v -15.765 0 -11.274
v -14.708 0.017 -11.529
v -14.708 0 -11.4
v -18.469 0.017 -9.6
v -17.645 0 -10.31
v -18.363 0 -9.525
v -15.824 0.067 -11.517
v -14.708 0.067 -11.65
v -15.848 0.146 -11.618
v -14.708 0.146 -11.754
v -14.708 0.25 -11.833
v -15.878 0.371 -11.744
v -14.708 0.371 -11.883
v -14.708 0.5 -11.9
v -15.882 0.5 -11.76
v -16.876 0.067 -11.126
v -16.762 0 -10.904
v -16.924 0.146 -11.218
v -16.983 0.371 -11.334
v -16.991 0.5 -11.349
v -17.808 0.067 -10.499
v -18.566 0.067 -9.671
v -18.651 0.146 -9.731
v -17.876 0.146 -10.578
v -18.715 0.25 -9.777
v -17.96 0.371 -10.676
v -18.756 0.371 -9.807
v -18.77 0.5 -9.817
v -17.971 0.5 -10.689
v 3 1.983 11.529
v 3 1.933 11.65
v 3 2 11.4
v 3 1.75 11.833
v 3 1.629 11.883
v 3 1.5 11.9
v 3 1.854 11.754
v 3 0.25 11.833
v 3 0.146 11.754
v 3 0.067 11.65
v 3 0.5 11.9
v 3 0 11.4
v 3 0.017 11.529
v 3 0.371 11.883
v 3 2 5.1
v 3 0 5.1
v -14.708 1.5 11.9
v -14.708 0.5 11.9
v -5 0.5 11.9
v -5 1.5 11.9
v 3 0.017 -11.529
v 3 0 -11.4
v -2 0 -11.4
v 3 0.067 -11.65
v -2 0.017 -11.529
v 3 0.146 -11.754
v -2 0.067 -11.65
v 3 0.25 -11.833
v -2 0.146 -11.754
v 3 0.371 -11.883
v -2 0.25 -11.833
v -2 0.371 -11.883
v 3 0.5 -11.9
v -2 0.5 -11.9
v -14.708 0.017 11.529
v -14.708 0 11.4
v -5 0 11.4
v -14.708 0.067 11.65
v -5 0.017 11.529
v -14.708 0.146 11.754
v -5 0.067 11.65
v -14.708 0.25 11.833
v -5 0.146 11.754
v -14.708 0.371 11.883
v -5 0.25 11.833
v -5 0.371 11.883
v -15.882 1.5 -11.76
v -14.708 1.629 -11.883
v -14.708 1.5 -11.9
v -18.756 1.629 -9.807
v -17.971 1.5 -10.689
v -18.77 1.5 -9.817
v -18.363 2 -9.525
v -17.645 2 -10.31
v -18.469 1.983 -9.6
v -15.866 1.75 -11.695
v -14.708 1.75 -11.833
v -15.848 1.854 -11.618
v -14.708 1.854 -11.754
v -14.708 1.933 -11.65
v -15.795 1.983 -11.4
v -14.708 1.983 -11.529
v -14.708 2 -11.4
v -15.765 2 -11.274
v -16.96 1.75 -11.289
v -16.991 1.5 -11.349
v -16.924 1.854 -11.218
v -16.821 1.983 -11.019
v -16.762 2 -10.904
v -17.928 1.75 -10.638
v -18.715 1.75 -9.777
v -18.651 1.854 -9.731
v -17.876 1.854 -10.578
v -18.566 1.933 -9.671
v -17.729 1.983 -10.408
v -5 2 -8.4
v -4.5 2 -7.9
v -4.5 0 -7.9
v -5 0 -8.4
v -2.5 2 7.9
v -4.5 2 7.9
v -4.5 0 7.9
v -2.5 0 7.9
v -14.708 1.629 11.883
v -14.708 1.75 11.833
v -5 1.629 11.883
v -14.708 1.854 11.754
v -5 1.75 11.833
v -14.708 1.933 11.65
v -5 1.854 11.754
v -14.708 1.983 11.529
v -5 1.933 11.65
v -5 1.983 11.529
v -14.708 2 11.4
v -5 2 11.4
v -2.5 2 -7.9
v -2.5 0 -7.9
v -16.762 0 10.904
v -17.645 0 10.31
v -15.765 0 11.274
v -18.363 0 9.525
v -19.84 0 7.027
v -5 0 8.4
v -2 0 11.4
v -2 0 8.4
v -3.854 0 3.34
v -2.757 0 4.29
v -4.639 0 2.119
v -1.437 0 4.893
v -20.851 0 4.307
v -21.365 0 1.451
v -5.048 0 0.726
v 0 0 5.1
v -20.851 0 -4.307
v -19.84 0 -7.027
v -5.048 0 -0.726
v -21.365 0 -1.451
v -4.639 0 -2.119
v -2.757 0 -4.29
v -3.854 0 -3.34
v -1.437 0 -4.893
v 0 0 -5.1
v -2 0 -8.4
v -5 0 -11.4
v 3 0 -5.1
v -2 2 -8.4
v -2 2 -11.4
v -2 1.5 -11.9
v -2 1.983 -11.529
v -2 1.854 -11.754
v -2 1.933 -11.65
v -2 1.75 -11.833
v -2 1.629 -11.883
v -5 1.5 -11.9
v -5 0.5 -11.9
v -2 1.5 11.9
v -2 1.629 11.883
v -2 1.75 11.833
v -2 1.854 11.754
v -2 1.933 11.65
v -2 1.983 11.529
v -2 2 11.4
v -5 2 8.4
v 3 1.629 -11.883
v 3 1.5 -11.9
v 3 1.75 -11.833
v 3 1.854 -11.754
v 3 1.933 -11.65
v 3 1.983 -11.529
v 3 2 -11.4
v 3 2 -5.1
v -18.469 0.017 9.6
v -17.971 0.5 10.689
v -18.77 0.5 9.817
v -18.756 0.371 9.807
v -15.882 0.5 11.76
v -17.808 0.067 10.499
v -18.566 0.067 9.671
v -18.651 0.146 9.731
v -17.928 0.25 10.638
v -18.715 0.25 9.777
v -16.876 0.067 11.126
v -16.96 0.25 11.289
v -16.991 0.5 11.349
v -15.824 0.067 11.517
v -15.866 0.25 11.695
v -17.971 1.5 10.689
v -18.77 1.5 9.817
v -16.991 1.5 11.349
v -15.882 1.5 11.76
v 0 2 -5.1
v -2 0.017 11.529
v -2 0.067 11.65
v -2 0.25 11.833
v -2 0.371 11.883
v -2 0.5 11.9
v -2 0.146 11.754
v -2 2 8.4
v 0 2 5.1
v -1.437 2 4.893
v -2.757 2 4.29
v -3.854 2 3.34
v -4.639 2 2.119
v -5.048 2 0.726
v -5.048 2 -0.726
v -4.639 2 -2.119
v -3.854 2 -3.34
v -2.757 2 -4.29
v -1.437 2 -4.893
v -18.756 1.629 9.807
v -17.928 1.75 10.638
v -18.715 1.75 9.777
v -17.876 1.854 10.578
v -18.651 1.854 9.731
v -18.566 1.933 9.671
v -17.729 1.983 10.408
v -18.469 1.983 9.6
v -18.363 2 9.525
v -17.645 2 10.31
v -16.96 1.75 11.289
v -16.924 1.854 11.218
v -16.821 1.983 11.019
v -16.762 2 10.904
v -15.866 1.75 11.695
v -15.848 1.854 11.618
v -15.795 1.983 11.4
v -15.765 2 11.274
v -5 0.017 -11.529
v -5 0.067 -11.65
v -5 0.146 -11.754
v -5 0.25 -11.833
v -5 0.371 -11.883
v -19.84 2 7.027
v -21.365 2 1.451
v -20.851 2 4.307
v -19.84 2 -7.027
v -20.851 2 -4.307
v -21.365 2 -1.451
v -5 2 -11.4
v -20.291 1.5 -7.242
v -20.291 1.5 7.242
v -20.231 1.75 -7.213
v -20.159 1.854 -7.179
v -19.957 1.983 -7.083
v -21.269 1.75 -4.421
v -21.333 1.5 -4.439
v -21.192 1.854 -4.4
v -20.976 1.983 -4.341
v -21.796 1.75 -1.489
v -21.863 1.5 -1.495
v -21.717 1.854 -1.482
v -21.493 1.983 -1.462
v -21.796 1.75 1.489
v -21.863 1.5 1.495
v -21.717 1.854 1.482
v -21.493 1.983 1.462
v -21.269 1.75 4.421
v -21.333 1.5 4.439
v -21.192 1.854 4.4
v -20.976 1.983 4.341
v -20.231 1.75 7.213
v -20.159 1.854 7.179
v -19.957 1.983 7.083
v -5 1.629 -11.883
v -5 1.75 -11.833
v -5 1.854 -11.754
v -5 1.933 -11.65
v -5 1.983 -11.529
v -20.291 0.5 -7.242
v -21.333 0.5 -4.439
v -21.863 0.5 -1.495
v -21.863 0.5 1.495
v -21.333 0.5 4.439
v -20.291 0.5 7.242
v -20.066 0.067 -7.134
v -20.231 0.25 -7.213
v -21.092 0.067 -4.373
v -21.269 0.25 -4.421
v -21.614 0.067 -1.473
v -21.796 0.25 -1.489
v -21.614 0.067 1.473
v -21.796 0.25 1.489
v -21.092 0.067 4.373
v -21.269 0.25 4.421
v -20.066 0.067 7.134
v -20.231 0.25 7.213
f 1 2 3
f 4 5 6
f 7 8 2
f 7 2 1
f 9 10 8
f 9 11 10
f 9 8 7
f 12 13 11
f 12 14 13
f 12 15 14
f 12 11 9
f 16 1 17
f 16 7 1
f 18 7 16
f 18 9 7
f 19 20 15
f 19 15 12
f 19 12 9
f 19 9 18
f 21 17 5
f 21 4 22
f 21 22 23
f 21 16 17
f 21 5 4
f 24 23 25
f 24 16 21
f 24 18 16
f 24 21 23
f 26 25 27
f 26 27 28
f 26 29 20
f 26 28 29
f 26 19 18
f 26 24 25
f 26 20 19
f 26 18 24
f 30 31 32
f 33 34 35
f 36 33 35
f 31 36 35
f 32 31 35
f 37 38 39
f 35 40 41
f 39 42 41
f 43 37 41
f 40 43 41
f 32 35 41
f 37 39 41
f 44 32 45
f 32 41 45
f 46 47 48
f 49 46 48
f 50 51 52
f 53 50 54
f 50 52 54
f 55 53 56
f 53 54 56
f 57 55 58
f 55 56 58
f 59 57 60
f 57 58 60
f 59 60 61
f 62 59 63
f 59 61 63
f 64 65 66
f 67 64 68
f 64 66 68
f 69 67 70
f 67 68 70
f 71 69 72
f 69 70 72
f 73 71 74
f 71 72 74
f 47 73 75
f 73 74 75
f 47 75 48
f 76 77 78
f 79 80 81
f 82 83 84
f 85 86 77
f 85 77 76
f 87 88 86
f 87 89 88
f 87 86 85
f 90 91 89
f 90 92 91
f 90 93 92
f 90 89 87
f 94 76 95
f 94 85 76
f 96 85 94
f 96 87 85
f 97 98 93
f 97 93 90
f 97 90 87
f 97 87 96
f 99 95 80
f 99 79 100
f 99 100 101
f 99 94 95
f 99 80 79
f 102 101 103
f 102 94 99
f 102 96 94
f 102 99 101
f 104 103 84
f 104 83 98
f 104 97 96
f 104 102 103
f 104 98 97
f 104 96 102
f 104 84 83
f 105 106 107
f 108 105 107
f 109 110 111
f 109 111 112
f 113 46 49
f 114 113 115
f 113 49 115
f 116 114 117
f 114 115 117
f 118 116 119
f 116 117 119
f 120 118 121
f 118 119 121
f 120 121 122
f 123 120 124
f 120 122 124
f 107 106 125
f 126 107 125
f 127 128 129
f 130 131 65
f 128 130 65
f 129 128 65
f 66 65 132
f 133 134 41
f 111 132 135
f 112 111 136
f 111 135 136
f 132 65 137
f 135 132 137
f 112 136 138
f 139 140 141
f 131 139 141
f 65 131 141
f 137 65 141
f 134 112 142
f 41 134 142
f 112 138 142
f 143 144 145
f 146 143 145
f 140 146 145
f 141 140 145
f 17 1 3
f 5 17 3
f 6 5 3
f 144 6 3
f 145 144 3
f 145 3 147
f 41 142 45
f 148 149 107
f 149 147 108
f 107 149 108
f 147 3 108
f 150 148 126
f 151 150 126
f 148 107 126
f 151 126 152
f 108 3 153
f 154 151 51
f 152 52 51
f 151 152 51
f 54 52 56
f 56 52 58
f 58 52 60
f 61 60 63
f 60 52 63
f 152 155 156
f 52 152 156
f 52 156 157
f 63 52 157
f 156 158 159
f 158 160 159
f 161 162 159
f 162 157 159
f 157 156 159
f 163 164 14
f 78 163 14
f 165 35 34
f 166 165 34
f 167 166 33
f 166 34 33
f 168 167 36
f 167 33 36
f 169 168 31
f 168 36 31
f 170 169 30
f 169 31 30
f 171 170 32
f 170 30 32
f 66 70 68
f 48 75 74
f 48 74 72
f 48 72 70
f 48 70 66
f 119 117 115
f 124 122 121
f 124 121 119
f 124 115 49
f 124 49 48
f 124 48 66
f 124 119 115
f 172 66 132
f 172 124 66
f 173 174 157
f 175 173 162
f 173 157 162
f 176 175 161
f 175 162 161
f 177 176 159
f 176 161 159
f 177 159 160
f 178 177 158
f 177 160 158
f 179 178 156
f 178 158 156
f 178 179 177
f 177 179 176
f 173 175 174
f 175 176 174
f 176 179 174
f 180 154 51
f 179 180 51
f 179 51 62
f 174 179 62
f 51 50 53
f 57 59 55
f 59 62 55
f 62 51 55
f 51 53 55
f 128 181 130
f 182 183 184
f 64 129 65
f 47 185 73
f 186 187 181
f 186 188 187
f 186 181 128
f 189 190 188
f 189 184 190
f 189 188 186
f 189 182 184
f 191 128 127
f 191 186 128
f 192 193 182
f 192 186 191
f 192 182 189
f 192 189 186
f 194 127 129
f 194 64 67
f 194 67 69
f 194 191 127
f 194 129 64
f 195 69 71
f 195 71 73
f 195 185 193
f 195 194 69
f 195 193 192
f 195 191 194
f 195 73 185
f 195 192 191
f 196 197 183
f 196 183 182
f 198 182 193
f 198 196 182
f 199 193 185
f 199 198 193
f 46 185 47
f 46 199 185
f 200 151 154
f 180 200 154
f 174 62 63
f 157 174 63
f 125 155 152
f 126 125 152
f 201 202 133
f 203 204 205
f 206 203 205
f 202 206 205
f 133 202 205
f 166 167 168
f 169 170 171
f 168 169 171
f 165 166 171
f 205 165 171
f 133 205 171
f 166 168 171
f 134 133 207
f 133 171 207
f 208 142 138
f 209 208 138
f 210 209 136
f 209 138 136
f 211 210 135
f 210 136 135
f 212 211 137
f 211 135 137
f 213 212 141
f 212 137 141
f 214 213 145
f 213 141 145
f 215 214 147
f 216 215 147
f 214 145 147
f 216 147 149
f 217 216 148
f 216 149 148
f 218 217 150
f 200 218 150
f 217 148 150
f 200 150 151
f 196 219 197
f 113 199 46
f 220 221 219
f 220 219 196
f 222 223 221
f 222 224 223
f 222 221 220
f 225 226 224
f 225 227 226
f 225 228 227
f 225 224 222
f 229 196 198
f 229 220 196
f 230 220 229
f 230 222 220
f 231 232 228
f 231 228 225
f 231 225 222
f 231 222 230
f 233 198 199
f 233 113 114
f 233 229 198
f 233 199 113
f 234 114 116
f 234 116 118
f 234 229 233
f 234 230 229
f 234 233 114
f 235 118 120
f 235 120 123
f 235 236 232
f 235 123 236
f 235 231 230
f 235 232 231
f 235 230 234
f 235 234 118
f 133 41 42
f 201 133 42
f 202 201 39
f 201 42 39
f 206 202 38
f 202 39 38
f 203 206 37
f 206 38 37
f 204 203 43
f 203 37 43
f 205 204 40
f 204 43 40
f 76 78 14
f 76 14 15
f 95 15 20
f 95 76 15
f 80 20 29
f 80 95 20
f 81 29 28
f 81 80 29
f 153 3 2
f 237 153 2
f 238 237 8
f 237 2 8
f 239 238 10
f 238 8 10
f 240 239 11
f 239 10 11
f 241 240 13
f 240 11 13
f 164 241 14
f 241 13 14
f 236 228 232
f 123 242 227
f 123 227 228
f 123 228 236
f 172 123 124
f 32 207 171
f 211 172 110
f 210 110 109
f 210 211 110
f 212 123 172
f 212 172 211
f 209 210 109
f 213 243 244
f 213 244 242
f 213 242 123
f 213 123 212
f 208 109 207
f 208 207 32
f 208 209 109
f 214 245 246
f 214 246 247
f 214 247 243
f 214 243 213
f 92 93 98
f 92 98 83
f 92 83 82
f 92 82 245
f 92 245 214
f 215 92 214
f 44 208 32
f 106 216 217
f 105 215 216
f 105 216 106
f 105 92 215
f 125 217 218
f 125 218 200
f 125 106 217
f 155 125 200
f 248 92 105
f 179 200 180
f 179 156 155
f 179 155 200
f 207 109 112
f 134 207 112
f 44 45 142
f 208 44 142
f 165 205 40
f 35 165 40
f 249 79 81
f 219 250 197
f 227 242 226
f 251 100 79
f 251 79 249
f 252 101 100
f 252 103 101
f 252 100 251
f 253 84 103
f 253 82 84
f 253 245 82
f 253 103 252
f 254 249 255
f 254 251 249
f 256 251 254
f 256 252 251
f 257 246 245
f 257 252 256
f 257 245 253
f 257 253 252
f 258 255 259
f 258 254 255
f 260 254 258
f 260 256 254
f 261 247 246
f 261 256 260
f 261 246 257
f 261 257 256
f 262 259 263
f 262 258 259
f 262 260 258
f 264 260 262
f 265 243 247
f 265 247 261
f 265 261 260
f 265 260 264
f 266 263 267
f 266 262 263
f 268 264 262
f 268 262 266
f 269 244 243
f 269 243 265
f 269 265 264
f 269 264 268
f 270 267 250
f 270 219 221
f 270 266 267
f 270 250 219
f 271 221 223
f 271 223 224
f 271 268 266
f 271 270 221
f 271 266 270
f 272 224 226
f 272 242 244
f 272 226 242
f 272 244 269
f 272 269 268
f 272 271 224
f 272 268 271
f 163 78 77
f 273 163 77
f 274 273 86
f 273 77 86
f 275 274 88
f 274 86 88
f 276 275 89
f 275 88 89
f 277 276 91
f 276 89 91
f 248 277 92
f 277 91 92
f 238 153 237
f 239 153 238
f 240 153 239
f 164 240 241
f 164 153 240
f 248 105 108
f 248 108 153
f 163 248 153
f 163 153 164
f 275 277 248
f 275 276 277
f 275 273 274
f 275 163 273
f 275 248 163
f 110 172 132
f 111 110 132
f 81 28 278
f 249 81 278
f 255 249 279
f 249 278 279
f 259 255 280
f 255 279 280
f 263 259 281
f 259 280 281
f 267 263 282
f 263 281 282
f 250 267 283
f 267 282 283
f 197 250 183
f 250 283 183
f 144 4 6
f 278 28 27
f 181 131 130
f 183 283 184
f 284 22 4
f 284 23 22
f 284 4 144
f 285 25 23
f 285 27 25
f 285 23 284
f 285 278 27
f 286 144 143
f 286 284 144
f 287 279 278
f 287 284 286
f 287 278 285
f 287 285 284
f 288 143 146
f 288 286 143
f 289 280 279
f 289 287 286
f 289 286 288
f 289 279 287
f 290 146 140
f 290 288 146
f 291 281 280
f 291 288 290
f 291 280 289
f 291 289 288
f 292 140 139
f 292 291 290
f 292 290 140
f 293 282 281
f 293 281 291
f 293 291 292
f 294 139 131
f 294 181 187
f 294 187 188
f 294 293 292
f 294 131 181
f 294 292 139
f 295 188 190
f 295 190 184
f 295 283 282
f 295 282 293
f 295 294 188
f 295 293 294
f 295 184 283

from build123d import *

# Parameters (mm, degrees)
BOSS_EXTRUDE1_DEPTH = 2
FILLET2_R           = 5
FILLET1_R           = 0.5
SKETCH2_W           = 3
SKETCH2_H           = 7
CUT_EXTRUDE1_DEPTH  = 10
CHAMFER1_SIZE       = 0.5


with BuildPart() as part:
    # Sketch1 → Boss-Extrude1 (new body)
    with BuildSketch(Plane(origin=(0, 0, 0), x_dir=(1, 0, 0), z_dir=(0, 1, 0))):
        with BuildLine():
            Line((0, 5.1), (3, 5.1))
            Line((3, 5.1), (3, 11.9))
            Line((3, 11.9), (-17, 11.9))
            ThreePointArc((-17, 11.9), (-21.929141392, 0), (-17, -11.9))
            Line((-17, -11.9), (3, -11.9))
            Line((3, -11.9), (3, -5.1))
            Line((3, -5.1), (0, -5.1))
            ThreePointArc((0, -5.1), (-5.1, 0), (0, 5.1))
        make_face()
    extrude(amount=BOSS_EXTRUDE1_DEPTH)

    # Fillet2
    fillet2_edges = [part.edges().sort_by_distance(p)[0] for p in [
        (-17, 1, 11.9),
        (-17, 1, -11.9),
    ]]
    fillet(fillet2_edges, radius=FILLET2_R)

    # Fillet1
    fillet1_edges = [part.edges().sort_by_distance(p)[0] for p in [
        (-5.854128071, 2, -11.9),
        (-5.854128071, 0, 11.9),
        (-5.854128071, 2, 11.9),
        (-21.929141392, 0, 0),
        (-16.990510437, 0, -11.348743118),
        (-16.990510437, 0, 11.348743118),
        (-21.929141392, 2, 0),
        (-16.990510437, 2, -11.348743118),
        (-16.990510437, 2, 11.348743118),
        (-5.854128071, 0, -11.9),
    ]]
    fillet(fillet1_edges, radius=FILLET1_R)

    # Sketch2 → Cut-Extrude1 (cut)
    with BuildSketch(Plane(origin=(0, 2, 0), x_dir=(1, 0, 0), z_dir=(0, 1, 0))):
        with Locations((-3.5, 11.4)):
            Rectangle(SKETCH2_W, SKETCH2_H)
        with Locations((-3.5, -11.4)):
            Rectangle(SKETCH2_W, SKETCH2_H)
    extrude(amount=-CUT_EXTRUDE1_DEPTH, mode=Mode.SUBTRACT)

    # Chamfer1
    chamfer1_edges = [part.edges().sort_by_distance(p)[0] for p in [
        (-2, 1, -7.9),
        (-5, 1, -7.9),
        (-5, 1, 7.9),
        (-2, 1, 7.9),
    ]]
    chamfer(chamfer1_edges, length=CHAMFER1_SIZE)


solid = part.part
